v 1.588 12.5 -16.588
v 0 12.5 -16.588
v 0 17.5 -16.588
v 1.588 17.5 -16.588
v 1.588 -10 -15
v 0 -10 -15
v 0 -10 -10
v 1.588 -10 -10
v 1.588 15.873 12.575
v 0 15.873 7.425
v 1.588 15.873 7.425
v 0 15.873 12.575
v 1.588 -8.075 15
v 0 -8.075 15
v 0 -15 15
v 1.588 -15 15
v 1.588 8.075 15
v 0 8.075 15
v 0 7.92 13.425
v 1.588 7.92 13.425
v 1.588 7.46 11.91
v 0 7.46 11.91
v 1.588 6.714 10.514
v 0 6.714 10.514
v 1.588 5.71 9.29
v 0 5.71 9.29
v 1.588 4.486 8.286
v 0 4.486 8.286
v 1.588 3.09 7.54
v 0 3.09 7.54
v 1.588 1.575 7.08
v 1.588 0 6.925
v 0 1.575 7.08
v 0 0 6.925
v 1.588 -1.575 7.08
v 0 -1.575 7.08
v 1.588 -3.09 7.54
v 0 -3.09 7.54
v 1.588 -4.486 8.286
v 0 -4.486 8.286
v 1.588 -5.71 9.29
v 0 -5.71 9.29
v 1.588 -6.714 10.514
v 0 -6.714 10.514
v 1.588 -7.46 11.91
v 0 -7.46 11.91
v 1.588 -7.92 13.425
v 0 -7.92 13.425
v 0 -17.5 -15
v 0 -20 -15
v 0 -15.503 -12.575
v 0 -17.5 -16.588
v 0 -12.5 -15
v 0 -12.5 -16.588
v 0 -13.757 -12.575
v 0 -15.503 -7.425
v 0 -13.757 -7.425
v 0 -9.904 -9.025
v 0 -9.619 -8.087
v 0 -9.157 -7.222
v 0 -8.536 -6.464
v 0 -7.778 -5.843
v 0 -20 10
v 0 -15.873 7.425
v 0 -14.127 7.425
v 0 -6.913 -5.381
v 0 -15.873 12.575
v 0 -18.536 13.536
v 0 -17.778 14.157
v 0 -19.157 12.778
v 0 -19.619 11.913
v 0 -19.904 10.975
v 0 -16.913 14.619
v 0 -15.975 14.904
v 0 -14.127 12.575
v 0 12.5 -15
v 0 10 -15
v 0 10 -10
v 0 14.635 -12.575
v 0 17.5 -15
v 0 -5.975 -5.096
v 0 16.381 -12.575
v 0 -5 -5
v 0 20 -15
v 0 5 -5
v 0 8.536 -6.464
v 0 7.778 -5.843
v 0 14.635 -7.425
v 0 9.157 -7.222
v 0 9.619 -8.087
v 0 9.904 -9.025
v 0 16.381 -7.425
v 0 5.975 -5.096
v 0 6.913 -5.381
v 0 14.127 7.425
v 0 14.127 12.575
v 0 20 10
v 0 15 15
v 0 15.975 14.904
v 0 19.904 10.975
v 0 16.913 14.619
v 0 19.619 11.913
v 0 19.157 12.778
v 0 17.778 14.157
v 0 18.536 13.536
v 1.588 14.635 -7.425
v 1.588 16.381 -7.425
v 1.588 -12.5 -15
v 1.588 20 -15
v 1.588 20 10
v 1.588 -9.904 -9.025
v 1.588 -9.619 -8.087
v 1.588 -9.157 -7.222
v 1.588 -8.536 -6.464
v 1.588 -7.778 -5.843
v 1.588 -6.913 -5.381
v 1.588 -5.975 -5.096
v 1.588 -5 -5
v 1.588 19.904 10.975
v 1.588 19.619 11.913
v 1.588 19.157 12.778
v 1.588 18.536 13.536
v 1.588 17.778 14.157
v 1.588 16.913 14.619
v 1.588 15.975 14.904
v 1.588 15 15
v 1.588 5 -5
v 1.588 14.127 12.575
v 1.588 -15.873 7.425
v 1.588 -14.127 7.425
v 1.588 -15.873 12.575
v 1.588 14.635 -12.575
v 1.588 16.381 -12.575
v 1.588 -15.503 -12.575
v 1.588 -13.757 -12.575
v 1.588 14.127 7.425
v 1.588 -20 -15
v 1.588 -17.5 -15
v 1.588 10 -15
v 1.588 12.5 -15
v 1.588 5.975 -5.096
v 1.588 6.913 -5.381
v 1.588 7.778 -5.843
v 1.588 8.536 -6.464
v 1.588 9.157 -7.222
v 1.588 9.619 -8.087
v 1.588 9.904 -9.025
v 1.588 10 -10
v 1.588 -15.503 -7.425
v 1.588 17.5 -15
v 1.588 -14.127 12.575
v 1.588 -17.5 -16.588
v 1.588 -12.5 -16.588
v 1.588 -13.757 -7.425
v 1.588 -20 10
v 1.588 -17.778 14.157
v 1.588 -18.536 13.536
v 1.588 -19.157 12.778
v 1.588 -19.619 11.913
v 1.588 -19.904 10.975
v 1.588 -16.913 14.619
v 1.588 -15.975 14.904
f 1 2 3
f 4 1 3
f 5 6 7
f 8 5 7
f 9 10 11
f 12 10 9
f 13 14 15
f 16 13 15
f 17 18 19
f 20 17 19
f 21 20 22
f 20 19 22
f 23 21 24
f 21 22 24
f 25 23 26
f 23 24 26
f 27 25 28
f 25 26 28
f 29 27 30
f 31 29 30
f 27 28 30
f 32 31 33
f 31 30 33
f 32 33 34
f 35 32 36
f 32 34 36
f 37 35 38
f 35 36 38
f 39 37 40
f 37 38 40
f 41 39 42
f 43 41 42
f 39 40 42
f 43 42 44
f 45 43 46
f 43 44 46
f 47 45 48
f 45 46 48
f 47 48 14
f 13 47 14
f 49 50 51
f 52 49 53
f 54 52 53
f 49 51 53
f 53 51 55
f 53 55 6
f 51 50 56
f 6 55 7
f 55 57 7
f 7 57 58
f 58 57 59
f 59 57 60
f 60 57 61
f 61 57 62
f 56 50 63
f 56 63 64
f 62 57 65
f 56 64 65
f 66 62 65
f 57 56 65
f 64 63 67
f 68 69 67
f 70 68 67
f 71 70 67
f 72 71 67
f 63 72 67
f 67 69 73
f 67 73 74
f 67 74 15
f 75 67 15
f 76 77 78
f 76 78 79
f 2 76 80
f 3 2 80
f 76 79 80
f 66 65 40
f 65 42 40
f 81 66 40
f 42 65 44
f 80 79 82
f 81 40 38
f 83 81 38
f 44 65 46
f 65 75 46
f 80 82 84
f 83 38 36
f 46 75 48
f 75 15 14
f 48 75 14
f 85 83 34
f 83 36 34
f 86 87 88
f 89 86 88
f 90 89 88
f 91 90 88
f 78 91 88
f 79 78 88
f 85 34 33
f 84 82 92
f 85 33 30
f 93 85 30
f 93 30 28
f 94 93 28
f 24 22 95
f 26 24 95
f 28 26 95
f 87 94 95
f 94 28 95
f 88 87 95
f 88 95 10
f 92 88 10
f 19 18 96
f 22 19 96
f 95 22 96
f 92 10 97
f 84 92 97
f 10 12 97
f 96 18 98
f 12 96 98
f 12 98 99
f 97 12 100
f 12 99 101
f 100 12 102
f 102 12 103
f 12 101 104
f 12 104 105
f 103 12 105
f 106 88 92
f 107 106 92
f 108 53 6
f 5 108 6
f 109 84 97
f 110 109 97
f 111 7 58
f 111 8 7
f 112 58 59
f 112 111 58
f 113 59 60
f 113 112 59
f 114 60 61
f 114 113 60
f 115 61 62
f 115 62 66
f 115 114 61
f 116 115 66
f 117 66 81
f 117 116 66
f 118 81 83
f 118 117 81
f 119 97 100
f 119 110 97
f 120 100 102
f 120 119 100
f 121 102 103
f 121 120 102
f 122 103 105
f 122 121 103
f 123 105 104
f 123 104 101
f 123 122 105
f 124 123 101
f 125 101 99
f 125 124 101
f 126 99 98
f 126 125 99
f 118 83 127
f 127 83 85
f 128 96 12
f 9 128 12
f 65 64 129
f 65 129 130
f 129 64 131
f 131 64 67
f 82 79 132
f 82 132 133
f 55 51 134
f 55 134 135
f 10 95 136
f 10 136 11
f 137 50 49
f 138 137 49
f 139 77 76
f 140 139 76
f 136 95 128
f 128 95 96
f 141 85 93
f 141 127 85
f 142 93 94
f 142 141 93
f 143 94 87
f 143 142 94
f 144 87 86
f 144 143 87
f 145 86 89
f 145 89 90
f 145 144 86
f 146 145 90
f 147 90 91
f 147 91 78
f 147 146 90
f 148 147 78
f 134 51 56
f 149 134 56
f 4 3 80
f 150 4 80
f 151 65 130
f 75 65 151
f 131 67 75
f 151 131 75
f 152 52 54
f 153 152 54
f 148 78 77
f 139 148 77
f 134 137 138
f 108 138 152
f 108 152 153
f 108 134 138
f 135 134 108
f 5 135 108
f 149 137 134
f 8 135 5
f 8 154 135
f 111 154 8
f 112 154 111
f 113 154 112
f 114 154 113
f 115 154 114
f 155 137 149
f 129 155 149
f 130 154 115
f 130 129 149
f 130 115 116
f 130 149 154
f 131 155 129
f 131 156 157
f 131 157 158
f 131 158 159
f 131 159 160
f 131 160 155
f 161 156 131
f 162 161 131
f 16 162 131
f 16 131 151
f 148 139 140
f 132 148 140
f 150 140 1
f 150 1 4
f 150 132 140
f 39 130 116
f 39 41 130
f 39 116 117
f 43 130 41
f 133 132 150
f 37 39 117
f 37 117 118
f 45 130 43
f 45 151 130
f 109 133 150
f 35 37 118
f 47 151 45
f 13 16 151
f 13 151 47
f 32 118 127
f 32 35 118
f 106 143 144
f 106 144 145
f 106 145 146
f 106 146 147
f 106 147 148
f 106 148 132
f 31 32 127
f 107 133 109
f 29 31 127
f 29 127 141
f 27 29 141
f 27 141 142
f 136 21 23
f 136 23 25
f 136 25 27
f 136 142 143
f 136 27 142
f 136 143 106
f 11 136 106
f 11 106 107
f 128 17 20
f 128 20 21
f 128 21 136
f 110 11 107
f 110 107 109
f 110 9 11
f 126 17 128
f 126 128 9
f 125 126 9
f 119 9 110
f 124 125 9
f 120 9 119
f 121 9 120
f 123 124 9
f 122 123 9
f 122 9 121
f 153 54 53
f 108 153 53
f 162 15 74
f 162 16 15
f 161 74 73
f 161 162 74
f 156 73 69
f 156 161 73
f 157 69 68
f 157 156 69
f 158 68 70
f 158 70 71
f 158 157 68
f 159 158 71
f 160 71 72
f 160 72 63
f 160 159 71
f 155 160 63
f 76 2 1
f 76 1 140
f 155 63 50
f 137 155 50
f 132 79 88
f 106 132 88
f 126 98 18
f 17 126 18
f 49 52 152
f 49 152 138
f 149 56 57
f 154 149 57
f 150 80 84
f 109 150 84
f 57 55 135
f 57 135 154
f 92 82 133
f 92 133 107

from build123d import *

# Parameters (mm, degrees)
F0_W     = 1.74625
F0_H     = 5.15
F0_W_2   = 5
F0_H_2   = 1.5875
F1_DEPTH = 1.5875
F2_R     = 5


# Not quite as in the source:
# - a length typed as a fraction of an inch, garbled in the dataset ("3 / 203.2 mm" for 3/8 in), is restored


with BuildPart() as f1:
    # F0 (on Right) → F1 (new body)
    with BuildSketch(Plane.YZ):
        with BuildLine():
            Line((20, -15), (20, 15))
            Line((20, 15), (8.075, 15))
            ThreePointArc((8.075, 15), (0, 6.925), (-8.075, 15))
            Line((-8.075, 15), (-20, 15))
            Line((-20, 15), (-20, -15))
            Line((-20, -15), (-17.5, -15))
            Line((-17.5, -15), (-12.5, -15))
            Line((-12.5, -15), (-10, -15))
            Line((-10, -15), (-10, -5))
            Line((-10, -5), (10, -5))
            Line((10, -5), (10, -15))
            Line((10, -15), (12.5, -15))
            Line((12.5, -15), (17.5, -15))
            Line((17.5, -15), (20, -15))
        make_face()
        with Locations((-14.6303550991, -10)):
            Rectangle(F0_W, F0_H, mode=Mode.SUBTRACT)
        with Locations((15.5080378336, -10)):
            Rectangle(F0_W, F0_H, mode=Mode.SUBTRACT)
        with Locations((-15, 10)):
            Rectangle(F0_W, F0_H, mode=Mode.SUBTRACT)
        with Locations((15, 10)):
            Rectangle(F0_W, F0_H, mode=Mode.SUBTRACT)
        with Locations((-15, -15.79375)):
            Rectangle(F0_W_2, F0_H_2)
        with Locations((15, -15.79375)):
            Rectangle(F0_W_2, F0_H_2)
    extrude(amount=F1_DEPTH)

    # F2
    f2_edges = [f1.edges().sort_by_distance(p)[0] for p in [
        (0.79375, -10, -5),
        (0.79375, 10, -5),
        (0.79375, 20, 15),
        (0.79375, -20, 15),
    ]]
    fillet(f2_edges, radius=F2_R)


solid = f1.part
